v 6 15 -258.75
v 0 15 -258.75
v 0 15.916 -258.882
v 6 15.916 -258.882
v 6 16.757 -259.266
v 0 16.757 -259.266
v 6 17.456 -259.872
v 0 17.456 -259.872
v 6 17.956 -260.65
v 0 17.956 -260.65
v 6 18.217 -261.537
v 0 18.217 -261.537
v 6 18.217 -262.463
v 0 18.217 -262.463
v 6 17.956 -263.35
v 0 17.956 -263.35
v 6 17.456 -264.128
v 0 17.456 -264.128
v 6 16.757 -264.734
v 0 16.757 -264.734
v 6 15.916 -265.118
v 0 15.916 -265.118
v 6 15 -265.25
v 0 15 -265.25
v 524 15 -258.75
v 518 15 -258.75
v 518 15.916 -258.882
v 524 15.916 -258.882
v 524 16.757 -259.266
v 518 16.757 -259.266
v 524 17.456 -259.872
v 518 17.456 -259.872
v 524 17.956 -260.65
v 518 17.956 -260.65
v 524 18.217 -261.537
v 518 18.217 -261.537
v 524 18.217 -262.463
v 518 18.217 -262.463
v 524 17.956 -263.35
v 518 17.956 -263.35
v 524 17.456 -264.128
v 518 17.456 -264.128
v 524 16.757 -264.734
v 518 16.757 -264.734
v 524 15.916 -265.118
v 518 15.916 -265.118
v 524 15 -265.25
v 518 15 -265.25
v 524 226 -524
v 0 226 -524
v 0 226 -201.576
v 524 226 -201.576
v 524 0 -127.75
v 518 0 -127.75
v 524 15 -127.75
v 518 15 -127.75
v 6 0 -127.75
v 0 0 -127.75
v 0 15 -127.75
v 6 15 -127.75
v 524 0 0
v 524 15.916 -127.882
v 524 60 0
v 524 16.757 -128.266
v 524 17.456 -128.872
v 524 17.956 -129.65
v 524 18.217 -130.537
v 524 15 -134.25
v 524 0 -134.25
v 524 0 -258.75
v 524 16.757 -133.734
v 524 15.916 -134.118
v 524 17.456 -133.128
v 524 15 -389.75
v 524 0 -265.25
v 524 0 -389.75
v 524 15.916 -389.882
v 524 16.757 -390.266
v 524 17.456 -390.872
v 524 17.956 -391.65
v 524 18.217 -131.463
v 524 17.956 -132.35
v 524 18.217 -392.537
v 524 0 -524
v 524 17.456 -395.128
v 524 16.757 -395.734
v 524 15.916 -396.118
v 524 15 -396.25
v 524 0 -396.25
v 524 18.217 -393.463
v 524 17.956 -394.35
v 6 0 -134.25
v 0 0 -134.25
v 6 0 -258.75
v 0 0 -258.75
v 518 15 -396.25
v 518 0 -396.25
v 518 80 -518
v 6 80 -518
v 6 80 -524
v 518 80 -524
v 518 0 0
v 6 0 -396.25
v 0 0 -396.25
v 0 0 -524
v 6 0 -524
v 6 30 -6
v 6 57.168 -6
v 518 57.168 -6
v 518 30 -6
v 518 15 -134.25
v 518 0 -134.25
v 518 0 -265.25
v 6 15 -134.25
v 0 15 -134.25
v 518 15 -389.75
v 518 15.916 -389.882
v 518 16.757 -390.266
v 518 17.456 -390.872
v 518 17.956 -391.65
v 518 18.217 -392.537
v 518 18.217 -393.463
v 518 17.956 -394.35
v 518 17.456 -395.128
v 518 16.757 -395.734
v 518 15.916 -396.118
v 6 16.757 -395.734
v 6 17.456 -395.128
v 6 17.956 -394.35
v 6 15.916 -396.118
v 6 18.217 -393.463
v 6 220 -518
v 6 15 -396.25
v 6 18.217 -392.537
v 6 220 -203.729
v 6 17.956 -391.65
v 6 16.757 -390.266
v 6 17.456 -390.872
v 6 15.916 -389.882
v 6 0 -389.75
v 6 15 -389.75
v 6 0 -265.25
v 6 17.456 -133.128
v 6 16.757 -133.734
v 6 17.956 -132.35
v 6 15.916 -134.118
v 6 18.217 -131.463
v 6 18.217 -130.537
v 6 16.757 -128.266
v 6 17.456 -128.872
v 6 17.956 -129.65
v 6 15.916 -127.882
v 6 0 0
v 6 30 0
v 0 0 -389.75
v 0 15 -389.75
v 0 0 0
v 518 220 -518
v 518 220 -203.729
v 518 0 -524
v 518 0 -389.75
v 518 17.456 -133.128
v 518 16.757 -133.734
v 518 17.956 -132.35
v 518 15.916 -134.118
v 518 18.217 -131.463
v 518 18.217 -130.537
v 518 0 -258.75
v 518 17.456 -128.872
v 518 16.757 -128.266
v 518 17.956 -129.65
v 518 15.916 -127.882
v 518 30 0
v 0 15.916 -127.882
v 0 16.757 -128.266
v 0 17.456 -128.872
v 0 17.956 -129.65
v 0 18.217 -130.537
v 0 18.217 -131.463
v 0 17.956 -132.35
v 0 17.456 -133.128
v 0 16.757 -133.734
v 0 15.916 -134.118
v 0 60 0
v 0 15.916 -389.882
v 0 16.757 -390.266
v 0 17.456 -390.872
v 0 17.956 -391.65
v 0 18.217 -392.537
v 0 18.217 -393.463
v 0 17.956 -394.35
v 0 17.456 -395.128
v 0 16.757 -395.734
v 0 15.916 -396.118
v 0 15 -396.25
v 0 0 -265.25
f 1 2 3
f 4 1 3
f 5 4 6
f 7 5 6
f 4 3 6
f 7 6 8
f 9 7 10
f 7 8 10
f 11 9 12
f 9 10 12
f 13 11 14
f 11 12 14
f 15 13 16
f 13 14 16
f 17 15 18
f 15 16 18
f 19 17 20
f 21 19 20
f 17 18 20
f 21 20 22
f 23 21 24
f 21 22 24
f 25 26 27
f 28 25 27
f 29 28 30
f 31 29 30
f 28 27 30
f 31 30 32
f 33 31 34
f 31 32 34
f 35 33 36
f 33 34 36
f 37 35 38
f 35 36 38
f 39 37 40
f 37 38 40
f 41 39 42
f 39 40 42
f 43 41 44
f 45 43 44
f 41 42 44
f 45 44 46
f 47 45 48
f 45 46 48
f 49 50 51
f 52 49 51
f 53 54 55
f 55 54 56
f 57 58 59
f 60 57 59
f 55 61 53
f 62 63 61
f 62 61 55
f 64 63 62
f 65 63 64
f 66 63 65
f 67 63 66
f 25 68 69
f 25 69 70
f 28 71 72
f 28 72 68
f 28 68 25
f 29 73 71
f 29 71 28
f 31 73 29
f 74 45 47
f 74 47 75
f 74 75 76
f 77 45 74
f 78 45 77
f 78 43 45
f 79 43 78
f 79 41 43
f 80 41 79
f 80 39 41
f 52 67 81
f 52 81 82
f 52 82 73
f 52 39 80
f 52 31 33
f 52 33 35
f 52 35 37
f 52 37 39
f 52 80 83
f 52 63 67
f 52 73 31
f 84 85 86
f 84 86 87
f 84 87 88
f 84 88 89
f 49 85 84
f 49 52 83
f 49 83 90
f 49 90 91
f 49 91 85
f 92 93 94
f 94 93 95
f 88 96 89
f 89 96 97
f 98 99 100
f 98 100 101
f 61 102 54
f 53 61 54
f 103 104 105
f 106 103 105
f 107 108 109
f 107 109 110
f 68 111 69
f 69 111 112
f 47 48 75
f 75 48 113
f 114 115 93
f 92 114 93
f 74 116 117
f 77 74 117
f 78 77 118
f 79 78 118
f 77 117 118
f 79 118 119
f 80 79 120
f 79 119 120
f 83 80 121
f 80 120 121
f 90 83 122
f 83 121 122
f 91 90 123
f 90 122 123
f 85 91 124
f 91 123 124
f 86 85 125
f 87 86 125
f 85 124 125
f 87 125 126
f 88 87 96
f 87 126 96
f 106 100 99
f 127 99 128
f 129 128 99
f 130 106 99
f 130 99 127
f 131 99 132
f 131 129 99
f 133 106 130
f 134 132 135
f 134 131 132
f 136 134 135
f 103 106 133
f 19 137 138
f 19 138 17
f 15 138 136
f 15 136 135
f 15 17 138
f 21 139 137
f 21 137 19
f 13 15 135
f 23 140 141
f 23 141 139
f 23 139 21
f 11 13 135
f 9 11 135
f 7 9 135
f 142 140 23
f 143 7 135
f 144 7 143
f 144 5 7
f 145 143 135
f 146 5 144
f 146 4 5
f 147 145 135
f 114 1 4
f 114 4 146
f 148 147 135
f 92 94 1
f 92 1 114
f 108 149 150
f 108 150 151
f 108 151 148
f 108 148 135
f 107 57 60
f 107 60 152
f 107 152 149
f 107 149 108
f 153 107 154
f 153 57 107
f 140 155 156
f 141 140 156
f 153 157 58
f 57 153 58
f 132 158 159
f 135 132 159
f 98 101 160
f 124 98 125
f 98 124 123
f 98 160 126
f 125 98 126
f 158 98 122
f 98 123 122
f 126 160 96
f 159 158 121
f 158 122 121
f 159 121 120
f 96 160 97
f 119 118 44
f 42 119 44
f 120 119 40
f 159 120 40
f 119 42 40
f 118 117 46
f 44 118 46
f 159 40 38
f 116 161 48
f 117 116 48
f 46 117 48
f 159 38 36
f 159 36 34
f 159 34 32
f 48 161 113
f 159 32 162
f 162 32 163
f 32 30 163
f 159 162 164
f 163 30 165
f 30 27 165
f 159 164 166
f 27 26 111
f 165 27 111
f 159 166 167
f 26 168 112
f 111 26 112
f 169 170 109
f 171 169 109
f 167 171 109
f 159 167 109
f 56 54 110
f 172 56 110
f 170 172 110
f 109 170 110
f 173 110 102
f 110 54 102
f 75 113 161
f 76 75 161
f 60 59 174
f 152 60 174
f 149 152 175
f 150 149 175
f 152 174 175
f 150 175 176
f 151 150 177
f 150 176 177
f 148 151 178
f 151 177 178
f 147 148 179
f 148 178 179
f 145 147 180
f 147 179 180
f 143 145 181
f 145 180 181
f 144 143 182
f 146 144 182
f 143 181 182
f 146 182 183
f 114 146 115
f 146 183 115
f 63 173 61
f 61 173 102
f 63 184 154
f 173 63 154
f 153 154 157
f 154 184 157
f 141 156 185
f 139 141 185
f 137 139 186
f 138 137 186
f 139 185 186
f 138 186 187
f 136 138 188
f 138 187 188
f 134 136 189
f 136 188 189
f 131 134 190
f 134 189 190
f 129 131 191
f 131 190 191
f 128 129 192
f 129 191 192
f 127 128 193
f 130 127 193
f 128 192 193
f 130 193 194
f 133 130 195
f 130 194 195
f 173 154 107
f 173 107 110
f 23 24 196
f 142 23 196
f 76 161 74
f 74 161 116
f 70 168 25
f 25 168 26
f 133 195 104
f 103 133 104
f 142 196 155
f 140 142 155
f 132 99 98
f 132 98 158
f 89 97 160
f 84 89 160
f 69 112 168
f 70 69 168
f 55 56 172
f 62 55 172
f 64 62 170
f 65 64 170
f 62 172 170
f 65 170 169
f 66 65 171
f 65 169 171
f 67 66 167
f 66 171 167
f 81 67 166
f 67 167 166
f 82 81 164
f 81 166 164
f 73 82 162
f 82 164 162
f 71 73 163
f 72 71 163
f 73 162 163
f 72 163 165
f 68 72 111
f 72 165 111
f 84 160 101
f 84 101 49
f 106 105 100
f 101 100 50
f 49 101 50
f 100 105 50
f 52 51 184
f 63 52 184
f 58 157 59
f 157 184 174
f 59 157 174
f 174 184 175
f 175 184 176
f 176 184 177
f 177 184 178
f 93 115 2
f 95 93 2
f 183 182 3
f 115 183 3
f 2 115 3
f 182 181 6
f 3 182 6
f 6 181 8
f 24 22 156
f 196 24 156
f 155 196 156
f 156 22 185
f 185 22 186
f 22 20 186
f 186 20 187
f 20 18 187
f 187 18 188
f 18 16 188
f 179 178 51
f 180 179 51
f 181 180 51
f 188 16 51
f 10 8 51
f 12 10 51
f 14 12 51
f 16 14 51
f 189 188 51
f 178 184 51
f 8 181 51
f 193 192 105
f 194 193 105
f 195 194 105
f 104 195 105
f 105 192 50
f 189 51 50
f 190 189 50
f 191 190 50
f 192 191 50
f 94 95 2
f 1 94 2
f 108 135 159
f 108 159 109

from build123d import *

# Parameters (mm, degrees)
ESTRUSIONE_ESTRUSIONE1_DEPTH = 524
SVUOTA1_T                    = -6
SCHIZZO2_W                   = 512
SCHIZZO2_H                   = 6
TAGLIO_ESTRUSIONE1_DEPTH     = 30
SCHIZZO3_W                   = 512
SCHIZZO3_H                   = 6
TAGLIO_ESTRUSIONE2_DEPTH     = 80
TAGLIO_ESTRUSIONE3_DEPTH     = 775.74382863


with BuildPart() as part:
    # Schizzo1 → Estrusione-Estrusione1 (new body)
    with BuildSketch(Plane(origin=(0, 0, 0), x_dir=(0, 0, -1), z_dir=(1, 0, 0))):
        Polygon((524, 0), (524, 226), (201.576132106, 226), (0, 60), (0, 0), align=None)
    extrude(amount=ESTRUSIONE_ESTRUSIONE1_DEPTH)

    # Svuota1
    svuota1_openings = [part.faces().sort_by_distance(p)[0] for p in [
        (262, 0, -262),
    ]]
    offset(amount=SVUOTA1_T, openings=svuota1_openings, kind=Kind.INTERSECTION)

    # Schizzo2 → Taglio-Estrusione1 (cut)
    with BuildSketch(Plane.XZ):
        with Locations((262, -3)):
            Rectangle(SCHIZZO2_W, SCHIZZO2_H)
    extrude(amount=-TAGLIO_ESTRUSIONE1_DEPTH, mode=Mode.SUBTRACT)

    # Schizzo3 → Taglio-Estrusione2 (cut)
    with BuildSketch(Plane.XZ):
        with Locations((262, -521)):
            Rectangle(SCHIZZO3_W, SCHIZZO3_H)
    extrude(amount=-TAGLIO_ESTRUSIONE2_DEPTH, mode=Mode.SUBTRACT)

    # Schizzo4 → Taglio-Estrusione3 (cut, through all)
    with BuildSketch(Plane.ZY):
        with BuildLine():
            Line((-396.25, 15), (-396.25, 0))
            Line((-396.25, 0), (-389.75, 0))
            Line((-389.75, 0), (-389.75, 15))
            ThreePointArc((-389.75, 15), (-393, 18.25), (-396.25, 15))
        make_face()
        with BuildLine():
            Line((-265.25, 15), (-265.25, 0))
            Line((-265.25, 0), (-258.75, 0))
            Line((-258.75, 0), (-258.75, 15))
            ThreePointArc((-258.75, 15), (-262, 18.25), (-265.25, 15))
        make_face()
        with BuildLine():
            Line((-134.25, 0), (-127.75, 0))
            Line((-127.75, 0), (-127.75, 15))
            ThreePointArc((-127.75, 15), (-131, 18.25), (-134.25, 15))
            Line((-134.25, 15), (-134.25, 0))
        make_face()
    extrude(amount=-TAGLIO_ESTRUSIONE3_DEPTH, mode=Mode.SUBTRACT)


solid = part.part
